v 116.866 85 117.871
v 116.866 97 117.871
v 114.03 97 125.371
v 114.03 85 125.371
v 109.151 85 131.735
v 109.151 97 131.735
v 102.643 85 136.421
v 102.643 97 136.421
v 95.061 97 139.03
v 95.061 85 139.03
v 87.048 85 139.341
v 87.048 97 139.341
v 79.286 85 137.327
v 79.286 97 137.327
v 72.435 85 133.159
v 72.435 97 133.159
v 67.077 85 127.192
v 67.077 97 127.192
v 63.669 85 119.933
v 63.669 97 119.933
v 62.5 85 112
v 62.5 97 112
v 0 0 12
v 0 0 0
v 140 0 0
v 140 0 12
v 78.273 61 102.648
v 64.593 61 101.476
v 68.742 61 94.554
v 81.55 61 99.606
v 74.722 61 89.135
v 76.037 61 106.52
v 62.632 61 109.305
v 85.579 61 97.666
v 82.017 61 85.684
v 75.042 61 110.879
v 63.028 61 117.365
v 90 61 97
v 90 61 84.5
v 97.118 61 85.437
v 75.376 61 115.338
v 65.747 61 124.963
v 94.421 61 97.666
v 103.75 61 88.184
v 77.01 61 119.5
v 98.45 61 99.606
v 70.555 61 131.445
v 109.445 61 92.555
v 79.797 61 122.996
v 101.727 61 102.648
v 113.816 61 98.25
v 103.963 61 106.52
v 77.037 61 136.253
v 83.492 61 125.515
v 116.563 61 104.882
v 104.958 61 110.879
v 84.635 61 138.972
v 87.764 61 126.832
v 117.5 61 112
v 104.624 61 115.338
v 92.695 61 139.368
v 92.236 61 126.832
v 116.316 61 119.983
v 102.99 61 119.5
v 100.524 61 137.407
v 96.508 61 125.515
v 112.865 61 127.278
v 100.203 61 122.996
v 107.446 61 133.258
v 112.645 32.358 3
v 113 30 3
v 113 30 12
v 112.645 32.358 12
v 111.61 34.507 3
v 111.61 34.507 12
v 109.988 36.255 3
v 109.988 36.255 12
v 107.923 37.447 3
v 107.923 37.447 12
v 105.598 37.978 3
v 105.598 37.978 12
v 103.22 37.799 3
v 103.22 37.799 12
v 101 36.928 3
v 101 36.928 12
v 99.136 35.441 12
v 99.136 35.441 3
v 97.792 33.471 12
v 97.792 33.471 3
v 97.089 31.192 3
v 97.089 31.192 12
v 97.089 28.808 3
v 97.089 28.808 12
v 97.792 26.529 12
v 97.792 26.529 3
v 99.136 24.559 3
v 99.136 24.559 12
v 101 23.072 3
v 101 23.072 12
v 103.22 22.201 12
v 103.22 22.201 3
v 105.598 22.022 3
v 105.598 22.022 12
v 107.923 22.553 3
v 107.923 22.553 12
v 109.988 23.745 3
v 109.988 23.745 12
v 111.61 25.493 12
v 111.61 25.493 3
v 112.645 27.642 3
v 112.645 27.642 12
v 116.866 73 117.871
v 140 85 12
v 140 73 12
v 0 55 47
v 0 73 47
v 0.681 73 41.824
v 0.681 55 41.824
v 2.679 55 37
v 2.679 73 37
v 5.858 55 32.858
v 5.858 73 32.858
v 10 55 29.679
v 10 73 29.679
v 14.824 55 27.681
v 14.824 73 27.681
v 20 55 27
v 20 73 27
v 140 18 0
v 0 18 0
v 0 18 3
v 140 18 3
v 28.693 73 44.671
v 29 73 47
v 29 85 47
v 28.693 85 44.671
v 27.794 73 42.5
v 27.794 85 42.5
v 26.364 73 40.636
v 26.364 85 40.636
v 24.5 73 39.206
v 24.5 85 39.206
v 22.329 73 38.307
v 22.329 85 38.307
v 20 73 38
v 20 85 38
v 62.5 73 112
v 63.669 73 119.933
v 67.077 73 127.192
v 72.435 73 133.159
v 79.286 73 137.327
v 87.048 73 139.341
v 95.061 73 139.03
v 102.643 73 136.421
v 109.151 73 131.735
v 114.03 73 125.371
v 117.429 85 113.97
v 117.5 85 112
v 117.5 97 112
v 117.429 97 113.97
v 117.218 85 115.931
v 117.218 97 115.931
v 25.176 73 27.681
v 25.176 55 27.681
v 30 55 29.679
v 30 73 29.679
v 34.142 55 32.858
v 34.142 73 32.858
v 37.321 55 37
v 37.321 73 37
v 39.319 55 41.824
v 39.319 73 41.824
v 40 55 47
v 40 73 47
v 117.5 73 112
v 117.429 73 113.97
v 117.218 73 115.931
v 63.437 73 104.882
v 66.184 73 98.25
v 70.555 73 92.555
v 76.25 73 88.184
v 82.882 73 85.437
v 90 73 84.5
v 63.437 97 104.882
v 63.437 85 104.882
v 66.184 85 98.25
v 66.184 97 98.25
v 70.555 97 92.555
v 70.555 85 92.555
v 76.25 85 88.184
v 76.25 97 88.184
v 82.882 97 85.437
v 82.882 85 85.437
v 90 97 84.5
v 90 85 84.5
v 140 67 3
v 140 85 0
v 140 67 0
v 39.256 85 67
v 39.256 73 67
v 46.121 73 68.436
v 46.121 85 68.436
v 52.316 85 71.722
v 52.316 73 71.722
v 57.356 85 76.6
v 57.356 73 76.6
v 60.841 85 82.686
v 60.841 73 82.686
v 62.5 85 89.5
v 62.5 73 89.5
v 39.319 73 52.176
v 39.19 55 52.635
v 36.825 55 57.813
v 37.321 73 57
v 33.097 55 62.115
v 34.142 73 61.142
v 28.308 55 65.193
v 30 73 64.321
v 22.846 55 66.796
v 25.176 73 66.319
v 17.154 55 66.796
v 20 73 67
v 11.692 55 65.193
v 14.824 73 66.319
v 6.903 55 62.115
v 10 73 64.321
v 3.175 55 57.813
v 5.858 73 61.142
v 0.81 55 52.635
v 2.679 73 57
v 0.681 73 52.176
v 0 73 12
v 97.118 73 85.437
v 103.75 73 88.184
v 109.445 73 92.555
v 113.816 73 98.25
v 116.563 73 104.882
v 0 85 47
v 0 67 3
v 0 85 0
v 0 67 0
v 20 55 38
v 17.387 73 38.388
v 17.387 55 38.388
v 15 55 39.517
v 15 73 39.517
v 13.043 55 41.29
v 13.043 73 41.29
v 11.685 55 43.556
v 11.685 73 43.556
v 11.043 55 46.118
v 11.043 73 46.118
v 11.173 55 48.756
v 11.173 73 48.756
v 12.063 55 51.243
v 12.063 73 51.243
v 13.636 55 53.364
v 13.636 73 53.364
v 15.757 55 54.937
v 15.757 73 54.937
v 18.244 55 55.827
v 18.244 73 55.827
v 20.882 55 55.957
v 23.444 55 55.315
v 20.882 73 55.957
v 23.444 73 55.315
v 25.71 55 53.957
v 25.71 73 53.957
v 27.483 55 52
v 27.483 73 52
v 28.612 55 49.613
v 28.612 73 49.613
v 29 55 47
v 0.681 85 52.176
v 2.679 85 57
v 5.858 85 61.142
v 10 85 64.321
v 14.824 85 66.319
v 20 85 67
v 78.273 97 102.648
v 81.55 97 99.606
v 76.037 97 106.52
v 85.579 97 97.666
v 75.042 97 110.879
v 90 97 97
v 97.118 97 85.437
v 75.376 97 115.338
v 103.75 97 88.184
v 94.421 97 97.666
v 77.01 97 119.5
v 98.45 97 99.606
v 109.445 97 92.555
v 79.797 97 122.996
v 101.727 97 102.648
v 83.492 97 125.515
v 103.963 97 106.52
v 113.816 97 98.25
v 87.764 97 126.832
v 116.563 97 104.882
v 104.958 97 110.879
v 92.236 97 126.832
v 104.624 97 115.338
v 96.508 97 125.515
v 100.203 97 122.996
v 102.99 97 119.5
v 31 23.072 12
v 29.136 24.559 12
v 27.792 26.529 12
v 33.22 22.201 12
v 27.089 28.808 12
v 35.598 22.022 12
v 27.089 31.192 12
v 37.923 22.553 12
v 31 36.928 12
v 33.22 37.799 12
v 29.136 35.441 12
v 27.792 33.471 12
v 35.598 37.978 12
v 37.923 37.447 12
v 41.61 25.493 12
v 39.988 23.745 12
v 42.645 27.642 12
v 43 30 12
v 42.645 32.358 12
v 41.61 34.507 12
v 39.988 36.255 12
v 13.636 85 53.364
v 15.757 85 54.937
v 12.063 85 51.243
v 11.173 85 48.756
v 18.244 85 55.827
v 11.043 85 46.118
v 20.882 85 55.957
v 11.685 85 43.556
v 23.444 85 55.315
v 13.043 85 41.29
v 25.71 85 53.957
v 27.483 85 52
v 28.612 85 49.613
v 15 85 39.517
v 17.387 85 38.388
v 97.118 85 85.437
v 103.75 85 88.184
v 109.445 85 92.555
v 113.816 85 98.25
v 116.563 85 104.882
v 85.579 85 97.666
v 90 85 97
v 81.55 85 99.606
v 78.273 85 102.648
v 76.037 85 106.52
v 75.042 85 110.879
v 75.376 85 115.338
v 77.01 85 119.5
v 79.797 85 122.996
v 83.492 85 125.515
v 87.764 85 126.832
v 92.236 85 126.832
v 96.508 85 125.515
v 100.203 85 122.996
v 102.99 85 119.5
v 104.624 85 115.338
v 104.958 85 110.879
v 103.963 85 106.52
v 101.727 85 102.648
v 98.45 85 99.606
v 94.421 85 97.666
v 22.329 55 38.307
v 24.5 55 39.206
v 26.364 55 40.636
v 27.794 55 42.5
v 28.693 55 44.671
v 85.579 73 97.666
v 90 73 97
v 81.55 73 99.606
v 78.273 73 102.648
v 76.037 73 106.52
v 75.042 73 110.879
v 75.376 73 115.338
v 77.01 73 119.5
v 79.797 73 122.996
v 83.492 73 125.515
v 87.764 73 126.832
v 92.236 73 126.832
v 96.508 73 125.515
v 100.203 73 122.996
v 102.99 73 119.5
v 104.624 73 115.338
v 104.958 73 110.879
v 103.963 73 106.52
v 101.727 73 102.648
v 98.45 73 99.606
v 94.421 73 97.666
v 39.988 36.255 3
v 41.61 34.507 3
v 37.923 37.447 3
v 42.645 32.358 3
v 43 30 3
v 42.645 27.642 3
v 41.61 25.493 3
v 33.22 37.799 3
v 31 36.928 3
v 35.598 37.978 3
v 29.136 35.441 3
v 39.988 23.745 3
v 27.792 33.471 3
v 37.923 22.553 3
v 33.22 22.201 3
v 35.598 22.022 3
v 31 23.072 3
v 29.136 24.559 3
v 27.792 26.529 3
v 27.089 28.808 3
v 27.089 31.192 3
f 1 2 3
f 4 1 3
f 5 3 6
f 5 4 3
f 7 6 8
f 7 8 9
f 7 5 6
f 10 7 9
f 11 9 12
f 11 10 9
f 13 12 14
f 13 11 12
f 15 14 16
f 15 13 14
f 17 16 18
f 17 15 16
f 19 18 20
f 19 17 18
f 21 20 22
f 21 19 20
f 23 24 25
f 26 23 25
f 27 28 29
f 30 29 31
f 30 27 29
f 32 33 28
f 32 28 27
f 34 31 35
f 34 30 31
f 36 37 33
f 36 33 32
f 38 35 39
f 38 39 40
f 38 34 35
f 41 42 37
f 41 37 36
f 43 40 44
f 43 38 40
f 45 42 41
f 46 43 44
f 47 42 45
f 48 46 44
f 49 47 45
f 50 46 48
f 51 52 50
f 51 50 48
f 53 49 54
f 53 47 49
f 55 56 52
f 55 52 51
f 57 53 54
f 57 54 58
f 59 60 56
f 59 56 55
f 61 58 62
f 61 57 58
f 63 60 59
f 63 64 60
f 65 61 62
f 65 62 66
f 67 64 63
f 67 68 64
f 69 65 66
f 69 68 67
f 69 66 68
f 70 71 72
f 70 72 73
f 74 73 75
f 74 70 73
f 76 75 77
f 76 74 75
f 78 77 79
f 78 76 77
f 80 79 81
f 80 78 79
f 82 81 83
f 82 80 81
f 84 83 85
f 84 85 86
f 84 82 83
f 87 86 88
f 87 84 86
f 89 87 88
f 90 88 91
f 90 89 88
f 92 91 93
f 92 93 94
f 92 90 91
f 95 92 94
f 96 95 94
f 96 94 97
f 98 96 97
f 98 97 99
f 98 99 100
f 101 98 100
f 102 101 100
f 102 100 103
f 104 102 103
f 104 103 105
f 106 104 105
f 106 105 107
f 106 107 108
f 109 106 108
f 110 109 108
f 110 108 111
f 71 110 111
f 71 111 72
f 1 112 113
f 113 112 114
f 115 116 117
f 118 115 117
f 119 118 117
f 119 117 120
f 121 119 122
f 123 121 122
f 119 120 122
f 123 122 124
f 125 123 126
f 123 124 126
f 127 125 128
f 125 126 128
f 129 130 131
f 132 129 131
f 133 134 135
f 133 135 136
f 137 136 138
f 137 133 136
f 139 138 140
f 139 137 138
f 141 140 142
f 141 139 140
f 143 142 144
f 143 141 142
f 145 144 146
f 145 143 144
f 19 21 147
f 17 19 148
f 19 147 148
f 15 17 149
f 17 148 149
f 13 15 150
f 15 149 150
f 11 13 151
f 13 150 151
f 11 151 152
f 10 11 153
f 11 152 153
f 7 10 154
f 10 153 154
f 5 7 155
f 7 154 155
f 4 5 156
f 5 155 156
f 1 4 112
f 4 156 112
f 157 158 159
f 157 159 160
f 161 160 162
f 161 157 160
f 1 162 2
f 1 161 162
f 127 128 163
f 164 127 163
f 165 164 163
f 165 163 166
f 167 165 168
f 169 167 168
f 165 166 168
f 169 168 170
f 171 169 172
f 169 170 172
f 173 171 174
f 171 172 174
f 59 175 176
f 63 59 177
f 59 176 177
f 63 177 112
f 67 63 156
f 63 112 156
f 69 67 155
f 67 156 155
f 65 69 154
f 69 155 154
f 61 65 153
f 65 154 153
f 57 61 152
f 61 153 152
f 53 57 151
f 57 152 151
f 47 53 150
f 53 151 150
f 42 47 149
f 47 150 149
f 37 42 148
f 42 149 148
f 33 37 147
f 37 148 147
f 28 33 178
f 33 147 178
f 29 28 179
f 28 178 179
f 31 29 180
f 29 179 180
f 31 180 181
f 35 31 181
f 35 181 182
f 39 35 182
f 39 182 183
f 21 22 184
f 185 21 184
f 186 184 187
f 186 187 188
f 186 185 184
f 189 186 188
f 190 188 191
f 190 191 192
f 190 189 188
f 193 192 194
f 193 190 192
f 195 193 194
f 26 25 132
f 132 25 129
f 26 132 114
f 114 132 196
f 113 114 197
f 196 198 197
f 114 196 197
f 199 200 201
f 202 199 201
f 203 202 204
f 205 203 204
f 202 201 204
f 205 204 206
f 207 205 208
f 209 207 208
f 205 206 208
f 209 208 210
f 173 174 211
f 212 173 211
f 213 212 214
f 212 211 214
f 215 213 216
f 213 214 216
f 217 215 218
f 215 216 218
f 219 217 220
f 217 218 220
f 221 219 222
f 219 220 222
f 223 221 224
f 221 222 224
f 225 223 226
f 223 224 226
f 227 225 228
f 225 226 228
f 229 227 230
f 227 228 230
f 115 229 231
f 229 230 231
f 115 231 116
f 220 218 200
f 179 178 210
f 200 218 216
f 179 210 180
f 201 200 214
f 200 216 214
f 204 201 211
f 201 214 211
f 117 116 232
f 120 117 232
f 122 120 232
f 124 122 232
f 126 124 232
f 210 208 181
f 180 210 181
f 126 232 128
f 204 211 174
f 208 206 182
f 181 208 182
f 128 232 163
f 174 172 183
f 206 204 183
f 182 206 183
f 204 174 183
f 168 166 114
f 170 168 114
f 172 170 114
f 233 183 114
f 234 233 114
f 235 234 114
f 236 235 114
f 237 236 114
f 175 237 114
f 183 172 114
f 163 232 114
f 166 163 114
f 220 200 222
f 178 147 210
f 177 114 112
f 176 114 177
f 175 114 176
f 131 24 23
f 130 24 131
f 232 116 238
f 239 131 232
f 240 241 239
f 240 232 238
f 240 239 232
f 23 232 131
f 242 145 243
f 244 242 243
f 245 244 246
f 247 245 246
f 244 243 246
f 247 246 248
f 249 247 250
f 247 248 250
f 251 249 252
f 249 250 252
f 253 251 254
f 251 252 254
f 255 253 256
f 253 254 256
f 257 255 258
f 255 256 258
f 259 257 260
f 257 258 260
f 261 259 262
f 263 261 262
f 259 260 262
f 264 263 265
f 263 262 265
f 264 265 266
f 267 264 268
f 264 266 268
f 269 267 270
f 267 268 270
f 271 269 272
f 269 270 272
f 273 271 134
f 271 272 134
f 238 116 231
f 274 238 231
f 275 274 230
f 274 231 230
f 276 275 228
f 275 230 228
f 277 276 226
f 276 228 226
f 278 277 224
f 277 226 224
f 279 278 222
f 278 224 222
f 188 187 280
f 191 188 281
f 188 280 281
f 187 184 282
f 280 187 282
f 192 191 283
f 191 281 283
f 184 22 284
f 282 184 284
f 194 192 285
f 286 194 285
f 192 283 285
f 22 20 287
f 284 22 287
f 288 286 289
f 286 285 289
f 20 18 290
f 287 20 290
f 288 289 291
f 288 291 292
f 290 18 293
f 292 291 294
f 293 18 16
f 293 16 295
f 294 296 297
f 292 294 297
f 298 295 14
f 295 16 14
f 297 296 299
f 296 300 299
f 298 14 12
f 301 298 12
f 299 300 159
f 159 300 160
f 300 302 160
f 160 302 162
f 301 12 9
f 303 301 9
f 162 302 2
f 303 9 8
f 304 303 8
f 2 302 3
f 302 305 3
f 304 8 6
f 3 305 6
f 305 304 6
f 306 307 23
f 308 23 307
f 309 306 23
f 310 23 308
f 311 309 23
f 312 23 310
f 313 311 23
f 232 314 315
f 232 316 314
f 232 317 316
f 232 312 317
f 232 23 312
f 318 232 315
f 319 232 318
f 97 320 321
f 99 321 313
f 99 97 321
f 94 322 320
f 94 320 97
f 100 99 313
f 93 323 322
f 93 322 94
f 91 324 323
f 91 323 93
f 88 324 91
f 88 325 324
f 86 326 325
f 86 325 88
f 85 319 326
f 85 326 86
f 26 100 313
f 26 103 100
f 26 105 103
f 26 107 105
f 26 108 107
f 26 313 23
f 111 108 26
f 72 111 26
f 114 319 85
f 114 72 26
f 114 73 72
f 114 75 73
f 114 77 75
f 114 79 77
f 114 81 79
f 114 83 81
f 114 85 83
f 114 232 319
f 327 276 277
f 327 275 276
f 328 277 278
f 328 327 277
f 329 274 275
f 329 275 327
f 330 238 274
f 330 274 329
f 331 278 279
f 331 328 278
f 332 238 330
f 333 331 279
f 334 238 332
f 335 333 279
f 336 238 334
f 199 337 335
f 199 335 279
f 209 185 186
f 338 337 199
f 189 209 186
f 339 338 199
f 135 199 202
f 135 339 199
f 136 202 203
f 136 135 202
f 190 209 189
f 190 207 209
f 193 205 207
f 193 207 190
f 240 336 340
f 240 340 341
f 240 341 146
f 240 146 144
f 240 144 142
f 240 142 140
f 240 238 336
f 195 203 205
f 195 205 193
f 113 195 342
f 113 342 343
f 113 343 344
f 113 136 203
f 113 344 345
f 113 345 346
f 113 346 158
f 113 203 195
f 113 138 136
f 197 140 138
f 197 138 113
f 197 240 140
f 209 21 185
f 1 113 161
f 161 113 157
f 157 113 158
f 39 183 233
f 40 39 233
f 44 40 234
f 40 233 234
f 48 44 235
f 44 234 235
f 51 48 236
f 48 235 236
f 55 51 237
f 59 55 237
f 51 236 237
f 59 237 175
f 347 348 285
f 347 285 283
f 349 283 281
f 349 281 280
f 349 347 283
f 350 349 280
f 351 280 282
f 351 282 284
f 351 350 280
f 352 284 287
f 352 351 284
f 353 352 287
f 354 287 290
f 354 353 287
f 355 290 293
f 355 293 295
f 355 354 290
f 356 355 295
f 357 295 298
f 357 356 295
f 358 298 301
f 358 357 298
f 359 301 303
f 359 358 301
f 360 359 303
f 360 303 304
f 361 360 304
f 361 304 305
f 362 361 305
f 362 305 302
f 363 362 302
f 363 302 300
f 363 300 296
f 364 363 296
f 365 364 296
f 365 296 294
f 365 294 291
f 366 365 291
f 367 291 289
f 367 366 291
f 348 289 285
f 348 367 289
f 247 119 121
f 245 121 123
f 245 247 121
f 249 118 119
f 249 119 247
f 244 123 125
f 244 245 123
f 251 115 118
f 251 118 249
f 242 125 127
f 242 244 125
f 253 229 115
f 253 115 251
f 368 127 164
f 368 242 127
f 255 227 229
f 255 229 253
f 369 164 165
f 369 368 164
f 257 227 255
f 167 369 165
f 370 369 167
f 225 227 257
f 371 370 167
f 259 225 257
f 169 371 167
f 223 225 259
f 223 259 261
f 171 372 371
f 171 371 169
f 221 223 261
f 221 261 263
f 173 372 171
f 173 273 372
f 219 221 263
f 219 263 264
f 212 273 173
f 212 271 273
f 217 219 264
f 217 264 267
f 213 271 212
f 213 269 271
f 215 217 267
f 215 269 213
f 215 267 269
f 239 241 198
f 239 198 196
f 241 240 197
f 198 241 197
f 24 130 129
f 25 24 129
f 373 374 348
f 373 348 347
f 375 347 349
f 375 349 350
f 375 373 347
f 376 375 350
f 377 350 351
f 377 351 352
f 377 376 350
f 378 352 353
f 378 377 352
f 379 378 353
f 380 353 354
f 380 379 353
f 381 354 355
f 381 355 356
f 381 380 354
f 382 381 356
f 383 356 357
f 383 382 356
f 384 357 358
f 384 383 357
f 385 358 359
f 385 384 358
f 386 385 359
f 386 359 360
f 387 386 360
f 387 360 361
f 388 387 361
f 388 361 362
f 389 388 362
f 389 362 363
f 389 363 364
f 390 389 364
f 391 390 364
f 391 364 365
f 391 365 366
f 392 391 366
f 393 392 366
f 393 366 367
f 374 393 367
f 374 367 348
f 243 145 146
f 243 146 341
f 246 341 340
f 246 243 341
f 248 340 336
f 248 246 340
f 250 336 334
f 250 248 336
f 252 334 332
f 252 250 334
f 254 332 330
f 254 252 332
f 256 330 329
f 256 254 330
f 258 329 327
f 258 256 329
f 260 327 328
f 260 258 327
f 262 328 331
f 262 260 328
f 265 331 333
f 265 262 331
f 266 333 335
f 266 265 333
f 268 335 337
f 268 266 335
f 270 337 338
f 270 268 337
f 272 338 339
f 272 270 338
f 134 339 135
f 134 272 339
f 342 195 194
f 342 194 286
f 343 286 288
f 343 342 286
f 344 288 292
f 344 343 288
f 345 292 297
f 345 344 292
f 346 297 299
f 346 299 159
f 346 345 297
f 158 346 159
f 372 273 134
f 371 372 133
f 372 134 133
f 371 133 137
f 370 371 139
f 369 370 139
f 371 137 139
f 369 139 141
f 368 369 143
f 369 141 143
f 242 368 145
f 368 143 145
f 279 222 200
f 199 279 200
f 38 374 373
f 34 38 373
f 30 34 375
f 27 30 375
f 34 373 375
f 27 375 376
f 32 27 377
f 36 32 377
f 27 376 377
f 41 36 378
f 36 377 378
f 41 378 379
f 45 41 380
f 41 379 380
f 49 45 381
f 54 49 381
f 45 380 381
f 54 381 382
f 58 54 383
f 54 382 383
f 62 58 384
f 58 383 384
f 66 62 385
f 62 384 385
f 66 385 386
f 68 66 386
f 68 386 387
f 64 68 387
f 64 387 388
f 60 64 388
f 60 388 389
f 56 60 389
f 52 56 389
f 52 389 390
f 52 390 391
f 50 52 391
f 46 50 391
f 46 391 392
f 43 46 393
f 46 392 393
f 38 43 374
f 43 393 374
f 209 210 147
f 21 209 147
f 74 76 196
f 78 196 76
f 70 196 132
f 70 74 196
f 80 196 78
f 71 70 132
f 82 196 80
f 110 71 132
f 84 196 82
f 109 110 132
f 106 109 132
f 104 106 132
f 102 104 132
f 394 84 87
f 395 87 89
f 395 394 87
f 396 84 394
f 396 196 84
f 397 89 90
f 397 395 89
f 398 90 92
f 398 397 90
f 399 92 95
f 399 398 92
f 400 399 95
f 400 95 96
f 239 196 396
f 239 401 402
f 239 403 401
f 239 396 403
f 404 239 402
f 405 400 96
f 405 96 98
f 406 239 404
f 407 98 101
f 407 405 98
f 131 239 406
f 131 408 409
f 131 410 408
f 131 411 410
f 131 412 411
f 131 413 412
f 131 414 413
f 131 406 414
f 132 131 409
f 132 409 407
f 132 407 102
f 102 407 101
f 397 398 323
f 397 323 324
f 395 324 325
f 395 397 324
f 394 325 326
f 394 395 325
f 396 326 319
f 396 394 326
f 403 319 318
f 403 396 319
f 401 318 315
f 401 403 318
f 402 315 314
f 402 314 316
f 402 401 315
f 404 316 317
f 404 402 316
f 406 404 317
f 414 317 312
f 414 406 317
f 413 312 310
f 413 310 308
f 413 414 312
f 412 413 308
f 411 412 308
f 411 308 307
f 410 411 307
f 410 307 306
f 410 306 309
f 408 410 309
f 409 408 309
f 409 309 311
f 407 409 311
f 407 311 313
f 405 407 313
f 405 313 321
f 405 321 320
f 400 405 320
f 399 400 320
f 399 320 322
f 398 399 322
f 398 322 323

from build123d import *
from build123d import SkipClean  # not in build123d's __all__

# Parameters (mm, degrees)
F0_W      = 140
F0_H      = 85
F0_R      = 8
F1_DEPTH  = 12
F2_W      = 140
F2_H      = 12
F3_DEPTH  = 130
F5_DEPTH  = 18
F7_DEPTH  = 12
F9_DEPTH  = 25
F10_DEPTH = 25
F11_W     = 49
F11_H     = 3
F12_DEPTH = 140.001


# Not quite as in the source:
# - after a boolean that leaves OpenCascade's solid faulty, fix() repairs it
# - a feature of the source that left no trace in its solid (it failed there, or was rolled back) is left out
# - a pattern or mirror of a feature is missing from the dataset's text; its kind, count and spacing are read off the source's solid


with BuildPart() as f1:
    # F0 (on Top) → F1 (new body)
    with BuildSketch(Plane.XY):
        with Locations((70, 42.5)):
            Rectangle(F0_W, F0_H)
        with Locations((35, 30)):
            Circle(F0_R, mode=Mode.SUBTRACT)
        with Locations((105, 30)):
            Circle(F0_R, mode=Mode.SUBTRACT)
    extrude(amount=F1_DEPTH)

    # F2 (on face) → F3 (join)
    with BuildSketch(Plane.XY.offset(12)):
        with Locations((70, 79)):
            Rectangle(F2_W, F2_H)
    extrude(amount=F3_DEPTH)

    # F4 (on face) → F5 (join)
    with BuildSketch(Plane.XZ.offset(-73)):
        with BuildLine():
            ThreePointArc((40, 47), (20, 67), (0, 47))
            ThreePointArc((0, 47), (5.8578643763, 32.8578643763), (20, 27))
            ThreePointArc((20, 27), (34.1421356237, 32.8578643763), (40, 47))
        make_face()
        with BuildLine():
            ThreePointArc((29, 47), (26.3639610307, 40.6360389693), (20, 38))
            ThreePointArc((20, 38), (13.6360389693, 53.3639610307), (29, 47))
        make_face(mode=Mode.SUBTRACT)
    extrude(amount=F5_DEPTH)

    # F6 (on face) → F7 (join)
    with BuildSketch(Plane.XZ.offset(-73)):
        with BuildLine():
            ThreePointArc((117.5, 112), (70.5545635174, 131.4454364826), (90, 84.5))
            ThreePointArc((90, 84.5), (109.4454364826, 92.5545635174), (117.5, 112))
        make_face()
        with BuildLine():
            ThreePointArc((105, 112), (100.6066017178, 101.3933982822), (90, 97))
            ThreePointArc((90, 97), (79.3933982822, 122.6066017178), (105, 112))
        make_face(mode=Mode.SUBTRACT)
    f7 = extrude(amount=F7_DEPTH)

    # F7_copies: F7 across plane
    add(f7.mirror(Plane.ZX.offset(79)), clean=False)

    # F8 (on face) → F9 (cut)
    with BuildSketch(Plane.XZ.offset(-73)):
        with BuildLine():
            Line((62.5, 89.5), (62.5, 112))
            ThreePointArc((62.5, 112), (87.0476647591, 139.3410628291), (116.8660884819, 117.8705442409))
            Line((116.8660884819, 117.8705442409), (140, 12))
            Line((140, 12), (140, 142))
            Line((140, 142), (0, 142))
            Line((0, 142), (0, 47))
            ThreePointArc((0, 47), (5.8578643763, 61.1421356237), (20, 67))
            Line((20, 67), (35.9839461744, 67))
            Line((35.9839461744, 67), (39.2560265726, 67))
            ThreePointArc((39.2560265726, 67), (55.0078493135, 73.9836089388), (62.5, 89.5))
        make_face()
    with SkipClean():  # cleaning this boolean's faces spoils the solid; the shape is the same uncleaned
        extrude(amount=-F9_DEPTH, mode=Mode.SUBTRACT)

    # F10 (cut): faces of the model
    f10_faces = [f1.faces().sort_by_distance(p)[0] for p in [
        (90, 73, 112),
        (20, 73, 47),
    ]]
    extrude(f10_faces, amount=-F10_DEPTH, mode=Mode.SUBTRACT)

    add(f1.part.fix(), mode=Mode.REPLACE)

    # F11 (on face) → F12 (cut, through all)
    with BuildSketch(Plane(origin=(0, 0, 0), x_dir=(0, -1, 0), z_dir=(-1, 0, 0))):
        with Locations((-42.5, 1.5)):
            Rectangle(F11_W, F11_H)
    extrude(amount=-F12_DEPTH, mode=Mode.SUBTRACT)


solid = f1.part
